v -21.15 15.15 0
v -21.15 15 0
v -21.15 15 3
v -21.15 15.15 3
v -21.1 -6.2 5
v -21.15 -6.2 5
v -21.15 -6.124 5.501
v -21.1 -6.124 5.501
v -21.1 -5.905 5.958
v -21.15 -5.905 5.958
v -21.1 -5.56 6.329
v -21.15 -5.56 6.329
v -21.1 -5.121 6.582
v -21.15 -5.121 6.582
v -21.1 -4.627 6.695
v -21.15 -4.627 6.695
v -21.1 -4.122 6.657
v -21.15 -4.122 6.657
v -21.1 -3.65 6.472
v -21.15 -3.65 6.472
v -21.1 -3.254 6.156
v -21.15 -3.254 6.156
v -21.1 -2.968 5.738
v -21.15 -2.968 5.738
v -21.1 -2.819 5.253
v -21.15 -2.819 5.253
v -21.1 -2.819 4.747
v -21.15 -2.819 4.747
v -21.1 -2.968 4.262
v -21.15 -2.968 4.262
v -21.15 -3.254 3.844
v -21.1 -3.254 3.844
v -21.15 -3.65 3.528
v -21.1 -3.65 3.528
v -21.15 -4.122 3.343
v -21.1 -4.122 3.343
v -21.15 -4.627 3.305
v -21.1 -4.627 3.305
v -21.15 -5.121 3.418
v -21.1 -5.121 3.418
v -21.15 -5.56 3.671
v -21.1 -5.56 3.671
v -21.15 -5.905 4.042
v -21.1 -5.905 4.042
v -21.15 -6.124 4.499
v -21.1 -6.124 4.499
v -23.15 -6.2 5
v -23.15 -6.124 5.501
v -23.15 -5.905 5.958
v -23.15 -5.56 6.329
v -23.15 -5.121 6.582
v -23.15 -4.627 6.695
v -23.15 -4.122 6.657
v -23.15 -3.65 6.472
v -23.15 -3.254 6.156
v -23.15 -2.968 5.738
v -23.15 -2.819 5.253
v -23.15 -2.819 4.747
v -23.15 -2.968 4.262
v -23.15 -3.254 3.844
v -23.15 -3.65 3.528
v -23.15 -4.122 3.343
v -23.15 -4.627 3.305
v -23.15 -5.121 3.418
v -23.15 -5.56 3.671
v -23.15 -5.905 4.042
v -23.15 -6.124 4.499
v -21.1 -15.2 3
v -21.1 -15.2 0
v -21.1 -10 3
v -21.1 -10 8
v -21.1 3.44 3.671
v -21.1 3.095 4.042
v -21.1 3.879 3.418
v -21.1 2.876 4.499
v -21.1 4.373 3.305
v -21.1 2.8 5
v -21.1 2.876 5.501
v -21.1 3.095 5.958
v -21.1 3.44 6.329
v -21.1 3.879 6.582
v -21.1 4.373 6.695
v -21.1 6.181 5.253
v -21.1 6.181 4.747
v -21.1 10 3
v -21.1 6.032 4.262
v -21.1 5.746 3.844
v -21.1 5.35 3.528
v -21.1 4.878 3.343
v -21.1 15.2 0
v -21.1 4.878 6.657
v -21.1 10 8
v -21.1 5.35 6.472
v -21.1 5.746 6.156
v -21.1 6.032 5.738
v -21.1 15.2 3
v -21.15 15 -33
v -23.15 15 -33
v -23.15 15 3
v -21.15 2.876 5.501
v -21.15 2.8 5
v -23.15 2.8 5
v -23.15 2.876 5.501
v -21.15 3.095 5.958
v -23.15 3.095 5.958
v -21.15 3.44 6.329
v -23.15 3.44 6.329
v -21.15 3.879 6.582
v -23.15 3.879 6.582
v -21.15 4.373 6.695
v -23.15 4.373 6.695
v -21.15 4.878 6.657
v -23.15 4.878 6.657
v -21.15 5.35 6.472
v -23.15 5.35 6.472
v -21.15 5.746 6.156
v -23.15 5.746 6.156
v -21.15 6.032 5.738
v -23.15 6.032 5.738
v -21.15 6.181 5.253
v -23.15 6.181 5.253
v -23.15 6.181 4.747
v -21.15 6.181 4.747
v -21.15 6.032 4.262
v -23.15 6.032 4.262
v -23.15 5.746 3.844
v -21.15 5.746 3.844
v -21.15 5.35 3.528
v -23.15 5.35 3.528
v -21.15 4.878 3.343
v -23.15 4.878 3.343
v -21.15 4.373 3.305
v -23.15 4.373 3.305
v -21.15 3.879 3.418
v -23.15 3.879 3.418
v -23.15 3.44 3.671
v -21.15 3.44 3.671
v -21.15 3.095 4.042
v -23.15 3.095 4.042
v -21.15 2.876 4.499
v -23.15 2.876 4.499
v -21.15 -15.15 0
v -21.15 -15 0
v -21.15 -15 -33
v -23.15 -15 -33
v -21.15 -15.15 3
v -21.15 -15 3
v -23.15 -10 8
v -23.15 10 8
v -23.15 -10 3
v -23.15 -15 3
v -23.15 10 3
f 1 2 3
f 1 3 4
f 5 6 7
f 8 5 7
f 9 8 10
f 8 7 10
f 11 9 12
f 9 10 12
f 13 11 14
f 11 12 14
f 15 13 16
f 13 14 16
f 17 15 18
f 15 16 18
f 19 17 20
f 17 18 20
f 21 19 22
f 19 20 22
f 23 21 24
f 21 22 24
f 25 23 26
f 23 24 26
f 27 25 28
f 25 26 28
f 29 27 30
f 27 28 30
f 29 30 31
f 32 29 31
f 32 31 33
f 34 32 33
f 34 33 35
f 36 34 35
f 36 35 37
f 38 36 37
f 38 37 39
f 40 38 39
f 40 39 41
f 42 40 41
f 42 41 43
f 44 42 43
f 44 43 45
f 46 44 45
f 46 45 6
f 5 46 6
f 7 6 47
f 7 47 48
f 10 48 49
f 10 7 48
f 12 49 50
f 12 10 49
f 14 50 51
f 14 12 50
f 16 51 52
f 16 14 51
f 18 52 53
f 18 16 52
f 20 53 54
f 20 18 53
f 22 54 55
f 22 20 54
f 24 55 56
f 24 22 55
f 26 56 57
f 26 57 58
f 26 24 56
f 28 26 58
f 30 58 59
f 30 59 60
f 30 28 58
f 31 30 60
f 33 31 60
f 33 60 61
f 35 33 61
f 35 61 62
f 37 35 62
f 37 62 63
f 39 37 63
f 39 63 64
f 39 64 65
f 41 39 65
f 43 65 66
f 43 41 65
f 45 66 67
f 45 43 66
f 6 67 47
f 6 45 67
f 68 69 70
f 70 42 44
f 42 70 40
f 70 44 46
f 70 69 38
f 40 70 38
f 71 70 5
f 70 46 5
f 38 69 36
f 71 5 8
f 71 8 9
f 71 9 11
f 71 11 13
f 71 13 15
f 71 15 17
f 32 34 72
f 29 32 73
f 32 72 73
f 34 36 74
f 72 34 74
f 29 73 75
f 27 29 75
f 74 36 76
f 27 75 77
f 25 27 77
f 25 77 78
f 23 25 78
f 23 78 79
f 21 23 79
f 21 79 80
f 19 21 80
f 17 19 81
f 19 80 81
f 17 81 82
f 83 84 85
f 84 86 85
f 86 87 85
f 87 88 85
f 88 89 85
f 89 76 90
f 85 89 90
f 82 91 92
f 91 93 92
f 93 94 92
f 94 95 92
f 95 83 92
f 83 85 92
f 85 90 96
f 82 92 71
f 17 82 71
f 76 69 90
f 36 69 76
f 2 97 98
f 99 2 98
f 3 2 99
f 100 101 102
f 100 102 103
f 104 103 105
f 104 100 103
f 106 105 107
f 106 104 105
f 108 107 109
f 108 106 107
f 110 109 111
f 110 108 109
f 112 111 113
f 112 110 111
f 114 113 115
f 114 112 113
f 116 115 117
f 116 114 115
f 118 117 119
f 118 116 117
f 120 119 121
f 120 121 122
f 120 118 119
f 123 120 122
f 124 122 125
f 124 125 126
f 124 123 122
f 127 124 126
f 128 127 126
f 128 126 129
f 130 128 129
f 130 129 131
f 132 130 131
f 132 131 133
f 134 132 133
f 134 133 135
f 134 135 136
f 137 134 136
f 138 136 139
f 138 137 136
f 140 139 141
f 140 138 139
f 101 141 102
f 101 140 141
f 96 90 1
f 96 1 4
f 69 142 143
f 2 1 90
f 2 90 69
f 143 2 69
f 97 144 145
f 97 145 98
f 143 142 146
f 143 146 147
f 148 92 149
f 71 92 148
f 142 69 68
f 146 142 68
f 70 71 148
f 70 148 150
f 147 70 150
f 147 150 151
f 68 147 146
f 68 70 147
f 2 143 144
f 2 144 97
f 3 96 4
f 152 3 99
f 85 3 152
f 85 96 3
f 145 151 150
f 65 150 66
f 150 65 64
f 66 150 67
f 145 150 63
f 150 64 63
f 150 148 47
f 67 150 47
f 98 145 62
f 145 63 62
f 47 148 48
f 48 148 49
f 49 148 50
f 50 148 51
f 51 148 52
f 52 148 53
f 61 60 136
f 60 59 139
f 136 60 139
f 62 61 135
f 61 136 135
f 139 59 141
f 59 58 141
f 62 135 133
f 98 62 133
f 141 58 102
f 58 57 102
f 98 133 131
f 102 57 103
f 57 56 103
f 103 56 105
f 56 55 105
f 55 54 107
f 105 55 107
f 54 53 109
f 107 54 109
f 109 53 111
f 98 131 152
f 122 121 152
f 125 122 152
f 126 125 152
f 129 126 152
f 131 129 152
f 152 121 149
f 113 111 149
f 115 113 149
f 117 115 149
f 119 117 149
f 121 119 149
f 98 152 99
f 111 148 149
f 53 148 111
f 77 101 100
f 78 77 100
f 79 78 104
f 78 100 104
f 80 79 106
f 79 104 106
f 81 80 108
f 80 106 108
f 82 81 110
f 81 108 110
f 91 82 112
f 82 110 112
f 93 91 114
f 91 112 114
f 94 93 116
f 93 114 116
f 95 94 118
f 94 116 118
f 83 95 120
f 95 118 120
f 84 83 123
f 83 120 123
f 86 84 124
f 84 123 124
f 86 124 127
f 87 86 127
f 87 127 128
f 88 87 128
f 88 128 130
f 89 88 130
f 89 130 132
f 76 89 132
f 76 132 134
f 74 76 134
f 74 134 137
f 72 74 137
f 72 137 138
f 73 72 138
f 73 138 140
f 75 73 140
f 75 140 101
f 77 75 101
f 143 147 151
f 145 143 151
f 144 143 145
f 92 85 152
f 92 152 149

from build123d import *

# Parameters (mm, degrees)
SKETCH_W        = 42.3
SKETCH_H        = 40.3
SKETCH_R        = 12
SKETCH_R_2      = 1.7
PAD_DEPTH       = 3
CHAMFER_SIZE    = 5
SKETCH001_W     = 5
SKETCH001_H     = 20
PAD001_DEPTH    = 5
SKETCH002_R     = 1.7
POCKET_DEPTH    = 42.301
POCKET001_DEPTH = 1.5
SKETCH004_R     = 1.7
PAD002_DEPTH    = 2
SKETCH005_W     = 47.453737
SKETCH005_H     = 16.482529
POCKET002_DEPTH = 50


with BuildPart() as part:
    # Sketch → Pad (new body)
    with BuildSketch(Plane.XY):
        Rectangle(SKETCH_W, SKETCH_H)
        Circle(SKETCH_R, mode=Mode.SUBTRACT)
        with Locations((-15.5, 15.5)):
            Circle(SKETCH_R_2, mode=Mode.SUBTRACT)
        with Locations((-15.5, -15.5)):
            Circle(SKETCH_R_2, mode=Mode.SUBTRACT)
        with Locations((15.5, -15.5)):
            Circle(SKETCH_R_2, mode=Mode.SUBTRACT)
        with Locations((15.5, 15.5)):
            Circle(SKETCH_R_2, mode=Mode.SUBTRACT)
    extrude(amount=PAD_DEPTH)

    # Chamfer
    chamfer_edges = [part.edges().sort_by_distance(p)[0] for p in [
        (21.15, -20.15, 1.5),
        (-21.15, -20.15, 1.5),
        (21.15, 20.15, 1.5),
        (-21.15, 20.15, 1.5),
    ]]
    chamfer(chamfer_edges, length=CHAMFER_SIZE)

    # Sketch001 (on Face5 of Chamfer) → Pad001 (join)
    with BuildSketch(Plane.XY.offset(3)):
        with Locations((-18.65, 0)):
            Rectangle(SKETCH001_W, SKETCH001_H)
    extrude(amount=PAD001_DEPTH)

    # Sketch002 (on Face19 of Pad001) → Pocket (cut, through all)
    with BuildSketch(Plane(origin=(-21.15, 0, 0), x_dir=(0, -1, 0), z_dir=(-1, 0, 0))):
        with Locations((-4.5, 5)):
            Circle(SKETCH002_R)
        with Locations((4.5, 5)):
            Circle(SKETCH002_R)
    extrude(amount=-POCKET_DEPTH, mode=Mode.SUBTRACT)

    # Sketch003 (on DatumPlane) → Pocket001 (cut, symmetric)
    with BuildSketch(Plane(origin=(-18.65, 0, 0), x_dir=(0, -1, 0), z_dir=(-1, 0, 0))):
        Polygon((4.5, 1.65), (7.401185, 3.325), (7.401185, 13.325), (1.598815, 13.325), (1.598815, 3.325), align=None)
        Polygon((-4.5, 1.65), (-1.598815, 3.325), (-1.598815, 13.325), (-7.401185, 13.325), (-7.401185, 3.325), align=None)
    extrude(amount=POCKET001_DEPTH, both=True, mode=Mode.SUBTRACT)

    # Sketch004 (on Face6 of Pocket001) → Pad002 (join)
    with BuildSketch(Plane(origin=(-21.15, 0, 0), x_dir=(0, -1, 0), z_dir=(-1, 0, 0))):
        Polygon((15, -33), (-15, -33), (-15, 3), (-10, 3), (-10, 8), (10, 8), (10, 3), (15, 3), align=None)
        with Locations((-4.5, 5)):
            Circle(SKETCH004_R, mode=Mode.SUBTRACT)
        with Locations((4.5, 5)):
            Circle(SKETCH004_R, mode=Mode.SUBTRACT)
    extrude(amount=PAD002_DEPTH)

    # Sketch005 (on Face1 of Pad002) → Pocket002 (cut)
    with BuildSketch(Plane(origin=(0, 20.15, 0), x_dir=(-1, 0, 0), z_dir=(0, 1, 0))):
        with Locations((-2.626869, 2.50214)):
            Rectangle(SKETCH005_W, SKETCH005_H)
    extrude(amount=-POCKET002_DEPTH, mode=Mode.SUBTRACT)


solid = part.part
